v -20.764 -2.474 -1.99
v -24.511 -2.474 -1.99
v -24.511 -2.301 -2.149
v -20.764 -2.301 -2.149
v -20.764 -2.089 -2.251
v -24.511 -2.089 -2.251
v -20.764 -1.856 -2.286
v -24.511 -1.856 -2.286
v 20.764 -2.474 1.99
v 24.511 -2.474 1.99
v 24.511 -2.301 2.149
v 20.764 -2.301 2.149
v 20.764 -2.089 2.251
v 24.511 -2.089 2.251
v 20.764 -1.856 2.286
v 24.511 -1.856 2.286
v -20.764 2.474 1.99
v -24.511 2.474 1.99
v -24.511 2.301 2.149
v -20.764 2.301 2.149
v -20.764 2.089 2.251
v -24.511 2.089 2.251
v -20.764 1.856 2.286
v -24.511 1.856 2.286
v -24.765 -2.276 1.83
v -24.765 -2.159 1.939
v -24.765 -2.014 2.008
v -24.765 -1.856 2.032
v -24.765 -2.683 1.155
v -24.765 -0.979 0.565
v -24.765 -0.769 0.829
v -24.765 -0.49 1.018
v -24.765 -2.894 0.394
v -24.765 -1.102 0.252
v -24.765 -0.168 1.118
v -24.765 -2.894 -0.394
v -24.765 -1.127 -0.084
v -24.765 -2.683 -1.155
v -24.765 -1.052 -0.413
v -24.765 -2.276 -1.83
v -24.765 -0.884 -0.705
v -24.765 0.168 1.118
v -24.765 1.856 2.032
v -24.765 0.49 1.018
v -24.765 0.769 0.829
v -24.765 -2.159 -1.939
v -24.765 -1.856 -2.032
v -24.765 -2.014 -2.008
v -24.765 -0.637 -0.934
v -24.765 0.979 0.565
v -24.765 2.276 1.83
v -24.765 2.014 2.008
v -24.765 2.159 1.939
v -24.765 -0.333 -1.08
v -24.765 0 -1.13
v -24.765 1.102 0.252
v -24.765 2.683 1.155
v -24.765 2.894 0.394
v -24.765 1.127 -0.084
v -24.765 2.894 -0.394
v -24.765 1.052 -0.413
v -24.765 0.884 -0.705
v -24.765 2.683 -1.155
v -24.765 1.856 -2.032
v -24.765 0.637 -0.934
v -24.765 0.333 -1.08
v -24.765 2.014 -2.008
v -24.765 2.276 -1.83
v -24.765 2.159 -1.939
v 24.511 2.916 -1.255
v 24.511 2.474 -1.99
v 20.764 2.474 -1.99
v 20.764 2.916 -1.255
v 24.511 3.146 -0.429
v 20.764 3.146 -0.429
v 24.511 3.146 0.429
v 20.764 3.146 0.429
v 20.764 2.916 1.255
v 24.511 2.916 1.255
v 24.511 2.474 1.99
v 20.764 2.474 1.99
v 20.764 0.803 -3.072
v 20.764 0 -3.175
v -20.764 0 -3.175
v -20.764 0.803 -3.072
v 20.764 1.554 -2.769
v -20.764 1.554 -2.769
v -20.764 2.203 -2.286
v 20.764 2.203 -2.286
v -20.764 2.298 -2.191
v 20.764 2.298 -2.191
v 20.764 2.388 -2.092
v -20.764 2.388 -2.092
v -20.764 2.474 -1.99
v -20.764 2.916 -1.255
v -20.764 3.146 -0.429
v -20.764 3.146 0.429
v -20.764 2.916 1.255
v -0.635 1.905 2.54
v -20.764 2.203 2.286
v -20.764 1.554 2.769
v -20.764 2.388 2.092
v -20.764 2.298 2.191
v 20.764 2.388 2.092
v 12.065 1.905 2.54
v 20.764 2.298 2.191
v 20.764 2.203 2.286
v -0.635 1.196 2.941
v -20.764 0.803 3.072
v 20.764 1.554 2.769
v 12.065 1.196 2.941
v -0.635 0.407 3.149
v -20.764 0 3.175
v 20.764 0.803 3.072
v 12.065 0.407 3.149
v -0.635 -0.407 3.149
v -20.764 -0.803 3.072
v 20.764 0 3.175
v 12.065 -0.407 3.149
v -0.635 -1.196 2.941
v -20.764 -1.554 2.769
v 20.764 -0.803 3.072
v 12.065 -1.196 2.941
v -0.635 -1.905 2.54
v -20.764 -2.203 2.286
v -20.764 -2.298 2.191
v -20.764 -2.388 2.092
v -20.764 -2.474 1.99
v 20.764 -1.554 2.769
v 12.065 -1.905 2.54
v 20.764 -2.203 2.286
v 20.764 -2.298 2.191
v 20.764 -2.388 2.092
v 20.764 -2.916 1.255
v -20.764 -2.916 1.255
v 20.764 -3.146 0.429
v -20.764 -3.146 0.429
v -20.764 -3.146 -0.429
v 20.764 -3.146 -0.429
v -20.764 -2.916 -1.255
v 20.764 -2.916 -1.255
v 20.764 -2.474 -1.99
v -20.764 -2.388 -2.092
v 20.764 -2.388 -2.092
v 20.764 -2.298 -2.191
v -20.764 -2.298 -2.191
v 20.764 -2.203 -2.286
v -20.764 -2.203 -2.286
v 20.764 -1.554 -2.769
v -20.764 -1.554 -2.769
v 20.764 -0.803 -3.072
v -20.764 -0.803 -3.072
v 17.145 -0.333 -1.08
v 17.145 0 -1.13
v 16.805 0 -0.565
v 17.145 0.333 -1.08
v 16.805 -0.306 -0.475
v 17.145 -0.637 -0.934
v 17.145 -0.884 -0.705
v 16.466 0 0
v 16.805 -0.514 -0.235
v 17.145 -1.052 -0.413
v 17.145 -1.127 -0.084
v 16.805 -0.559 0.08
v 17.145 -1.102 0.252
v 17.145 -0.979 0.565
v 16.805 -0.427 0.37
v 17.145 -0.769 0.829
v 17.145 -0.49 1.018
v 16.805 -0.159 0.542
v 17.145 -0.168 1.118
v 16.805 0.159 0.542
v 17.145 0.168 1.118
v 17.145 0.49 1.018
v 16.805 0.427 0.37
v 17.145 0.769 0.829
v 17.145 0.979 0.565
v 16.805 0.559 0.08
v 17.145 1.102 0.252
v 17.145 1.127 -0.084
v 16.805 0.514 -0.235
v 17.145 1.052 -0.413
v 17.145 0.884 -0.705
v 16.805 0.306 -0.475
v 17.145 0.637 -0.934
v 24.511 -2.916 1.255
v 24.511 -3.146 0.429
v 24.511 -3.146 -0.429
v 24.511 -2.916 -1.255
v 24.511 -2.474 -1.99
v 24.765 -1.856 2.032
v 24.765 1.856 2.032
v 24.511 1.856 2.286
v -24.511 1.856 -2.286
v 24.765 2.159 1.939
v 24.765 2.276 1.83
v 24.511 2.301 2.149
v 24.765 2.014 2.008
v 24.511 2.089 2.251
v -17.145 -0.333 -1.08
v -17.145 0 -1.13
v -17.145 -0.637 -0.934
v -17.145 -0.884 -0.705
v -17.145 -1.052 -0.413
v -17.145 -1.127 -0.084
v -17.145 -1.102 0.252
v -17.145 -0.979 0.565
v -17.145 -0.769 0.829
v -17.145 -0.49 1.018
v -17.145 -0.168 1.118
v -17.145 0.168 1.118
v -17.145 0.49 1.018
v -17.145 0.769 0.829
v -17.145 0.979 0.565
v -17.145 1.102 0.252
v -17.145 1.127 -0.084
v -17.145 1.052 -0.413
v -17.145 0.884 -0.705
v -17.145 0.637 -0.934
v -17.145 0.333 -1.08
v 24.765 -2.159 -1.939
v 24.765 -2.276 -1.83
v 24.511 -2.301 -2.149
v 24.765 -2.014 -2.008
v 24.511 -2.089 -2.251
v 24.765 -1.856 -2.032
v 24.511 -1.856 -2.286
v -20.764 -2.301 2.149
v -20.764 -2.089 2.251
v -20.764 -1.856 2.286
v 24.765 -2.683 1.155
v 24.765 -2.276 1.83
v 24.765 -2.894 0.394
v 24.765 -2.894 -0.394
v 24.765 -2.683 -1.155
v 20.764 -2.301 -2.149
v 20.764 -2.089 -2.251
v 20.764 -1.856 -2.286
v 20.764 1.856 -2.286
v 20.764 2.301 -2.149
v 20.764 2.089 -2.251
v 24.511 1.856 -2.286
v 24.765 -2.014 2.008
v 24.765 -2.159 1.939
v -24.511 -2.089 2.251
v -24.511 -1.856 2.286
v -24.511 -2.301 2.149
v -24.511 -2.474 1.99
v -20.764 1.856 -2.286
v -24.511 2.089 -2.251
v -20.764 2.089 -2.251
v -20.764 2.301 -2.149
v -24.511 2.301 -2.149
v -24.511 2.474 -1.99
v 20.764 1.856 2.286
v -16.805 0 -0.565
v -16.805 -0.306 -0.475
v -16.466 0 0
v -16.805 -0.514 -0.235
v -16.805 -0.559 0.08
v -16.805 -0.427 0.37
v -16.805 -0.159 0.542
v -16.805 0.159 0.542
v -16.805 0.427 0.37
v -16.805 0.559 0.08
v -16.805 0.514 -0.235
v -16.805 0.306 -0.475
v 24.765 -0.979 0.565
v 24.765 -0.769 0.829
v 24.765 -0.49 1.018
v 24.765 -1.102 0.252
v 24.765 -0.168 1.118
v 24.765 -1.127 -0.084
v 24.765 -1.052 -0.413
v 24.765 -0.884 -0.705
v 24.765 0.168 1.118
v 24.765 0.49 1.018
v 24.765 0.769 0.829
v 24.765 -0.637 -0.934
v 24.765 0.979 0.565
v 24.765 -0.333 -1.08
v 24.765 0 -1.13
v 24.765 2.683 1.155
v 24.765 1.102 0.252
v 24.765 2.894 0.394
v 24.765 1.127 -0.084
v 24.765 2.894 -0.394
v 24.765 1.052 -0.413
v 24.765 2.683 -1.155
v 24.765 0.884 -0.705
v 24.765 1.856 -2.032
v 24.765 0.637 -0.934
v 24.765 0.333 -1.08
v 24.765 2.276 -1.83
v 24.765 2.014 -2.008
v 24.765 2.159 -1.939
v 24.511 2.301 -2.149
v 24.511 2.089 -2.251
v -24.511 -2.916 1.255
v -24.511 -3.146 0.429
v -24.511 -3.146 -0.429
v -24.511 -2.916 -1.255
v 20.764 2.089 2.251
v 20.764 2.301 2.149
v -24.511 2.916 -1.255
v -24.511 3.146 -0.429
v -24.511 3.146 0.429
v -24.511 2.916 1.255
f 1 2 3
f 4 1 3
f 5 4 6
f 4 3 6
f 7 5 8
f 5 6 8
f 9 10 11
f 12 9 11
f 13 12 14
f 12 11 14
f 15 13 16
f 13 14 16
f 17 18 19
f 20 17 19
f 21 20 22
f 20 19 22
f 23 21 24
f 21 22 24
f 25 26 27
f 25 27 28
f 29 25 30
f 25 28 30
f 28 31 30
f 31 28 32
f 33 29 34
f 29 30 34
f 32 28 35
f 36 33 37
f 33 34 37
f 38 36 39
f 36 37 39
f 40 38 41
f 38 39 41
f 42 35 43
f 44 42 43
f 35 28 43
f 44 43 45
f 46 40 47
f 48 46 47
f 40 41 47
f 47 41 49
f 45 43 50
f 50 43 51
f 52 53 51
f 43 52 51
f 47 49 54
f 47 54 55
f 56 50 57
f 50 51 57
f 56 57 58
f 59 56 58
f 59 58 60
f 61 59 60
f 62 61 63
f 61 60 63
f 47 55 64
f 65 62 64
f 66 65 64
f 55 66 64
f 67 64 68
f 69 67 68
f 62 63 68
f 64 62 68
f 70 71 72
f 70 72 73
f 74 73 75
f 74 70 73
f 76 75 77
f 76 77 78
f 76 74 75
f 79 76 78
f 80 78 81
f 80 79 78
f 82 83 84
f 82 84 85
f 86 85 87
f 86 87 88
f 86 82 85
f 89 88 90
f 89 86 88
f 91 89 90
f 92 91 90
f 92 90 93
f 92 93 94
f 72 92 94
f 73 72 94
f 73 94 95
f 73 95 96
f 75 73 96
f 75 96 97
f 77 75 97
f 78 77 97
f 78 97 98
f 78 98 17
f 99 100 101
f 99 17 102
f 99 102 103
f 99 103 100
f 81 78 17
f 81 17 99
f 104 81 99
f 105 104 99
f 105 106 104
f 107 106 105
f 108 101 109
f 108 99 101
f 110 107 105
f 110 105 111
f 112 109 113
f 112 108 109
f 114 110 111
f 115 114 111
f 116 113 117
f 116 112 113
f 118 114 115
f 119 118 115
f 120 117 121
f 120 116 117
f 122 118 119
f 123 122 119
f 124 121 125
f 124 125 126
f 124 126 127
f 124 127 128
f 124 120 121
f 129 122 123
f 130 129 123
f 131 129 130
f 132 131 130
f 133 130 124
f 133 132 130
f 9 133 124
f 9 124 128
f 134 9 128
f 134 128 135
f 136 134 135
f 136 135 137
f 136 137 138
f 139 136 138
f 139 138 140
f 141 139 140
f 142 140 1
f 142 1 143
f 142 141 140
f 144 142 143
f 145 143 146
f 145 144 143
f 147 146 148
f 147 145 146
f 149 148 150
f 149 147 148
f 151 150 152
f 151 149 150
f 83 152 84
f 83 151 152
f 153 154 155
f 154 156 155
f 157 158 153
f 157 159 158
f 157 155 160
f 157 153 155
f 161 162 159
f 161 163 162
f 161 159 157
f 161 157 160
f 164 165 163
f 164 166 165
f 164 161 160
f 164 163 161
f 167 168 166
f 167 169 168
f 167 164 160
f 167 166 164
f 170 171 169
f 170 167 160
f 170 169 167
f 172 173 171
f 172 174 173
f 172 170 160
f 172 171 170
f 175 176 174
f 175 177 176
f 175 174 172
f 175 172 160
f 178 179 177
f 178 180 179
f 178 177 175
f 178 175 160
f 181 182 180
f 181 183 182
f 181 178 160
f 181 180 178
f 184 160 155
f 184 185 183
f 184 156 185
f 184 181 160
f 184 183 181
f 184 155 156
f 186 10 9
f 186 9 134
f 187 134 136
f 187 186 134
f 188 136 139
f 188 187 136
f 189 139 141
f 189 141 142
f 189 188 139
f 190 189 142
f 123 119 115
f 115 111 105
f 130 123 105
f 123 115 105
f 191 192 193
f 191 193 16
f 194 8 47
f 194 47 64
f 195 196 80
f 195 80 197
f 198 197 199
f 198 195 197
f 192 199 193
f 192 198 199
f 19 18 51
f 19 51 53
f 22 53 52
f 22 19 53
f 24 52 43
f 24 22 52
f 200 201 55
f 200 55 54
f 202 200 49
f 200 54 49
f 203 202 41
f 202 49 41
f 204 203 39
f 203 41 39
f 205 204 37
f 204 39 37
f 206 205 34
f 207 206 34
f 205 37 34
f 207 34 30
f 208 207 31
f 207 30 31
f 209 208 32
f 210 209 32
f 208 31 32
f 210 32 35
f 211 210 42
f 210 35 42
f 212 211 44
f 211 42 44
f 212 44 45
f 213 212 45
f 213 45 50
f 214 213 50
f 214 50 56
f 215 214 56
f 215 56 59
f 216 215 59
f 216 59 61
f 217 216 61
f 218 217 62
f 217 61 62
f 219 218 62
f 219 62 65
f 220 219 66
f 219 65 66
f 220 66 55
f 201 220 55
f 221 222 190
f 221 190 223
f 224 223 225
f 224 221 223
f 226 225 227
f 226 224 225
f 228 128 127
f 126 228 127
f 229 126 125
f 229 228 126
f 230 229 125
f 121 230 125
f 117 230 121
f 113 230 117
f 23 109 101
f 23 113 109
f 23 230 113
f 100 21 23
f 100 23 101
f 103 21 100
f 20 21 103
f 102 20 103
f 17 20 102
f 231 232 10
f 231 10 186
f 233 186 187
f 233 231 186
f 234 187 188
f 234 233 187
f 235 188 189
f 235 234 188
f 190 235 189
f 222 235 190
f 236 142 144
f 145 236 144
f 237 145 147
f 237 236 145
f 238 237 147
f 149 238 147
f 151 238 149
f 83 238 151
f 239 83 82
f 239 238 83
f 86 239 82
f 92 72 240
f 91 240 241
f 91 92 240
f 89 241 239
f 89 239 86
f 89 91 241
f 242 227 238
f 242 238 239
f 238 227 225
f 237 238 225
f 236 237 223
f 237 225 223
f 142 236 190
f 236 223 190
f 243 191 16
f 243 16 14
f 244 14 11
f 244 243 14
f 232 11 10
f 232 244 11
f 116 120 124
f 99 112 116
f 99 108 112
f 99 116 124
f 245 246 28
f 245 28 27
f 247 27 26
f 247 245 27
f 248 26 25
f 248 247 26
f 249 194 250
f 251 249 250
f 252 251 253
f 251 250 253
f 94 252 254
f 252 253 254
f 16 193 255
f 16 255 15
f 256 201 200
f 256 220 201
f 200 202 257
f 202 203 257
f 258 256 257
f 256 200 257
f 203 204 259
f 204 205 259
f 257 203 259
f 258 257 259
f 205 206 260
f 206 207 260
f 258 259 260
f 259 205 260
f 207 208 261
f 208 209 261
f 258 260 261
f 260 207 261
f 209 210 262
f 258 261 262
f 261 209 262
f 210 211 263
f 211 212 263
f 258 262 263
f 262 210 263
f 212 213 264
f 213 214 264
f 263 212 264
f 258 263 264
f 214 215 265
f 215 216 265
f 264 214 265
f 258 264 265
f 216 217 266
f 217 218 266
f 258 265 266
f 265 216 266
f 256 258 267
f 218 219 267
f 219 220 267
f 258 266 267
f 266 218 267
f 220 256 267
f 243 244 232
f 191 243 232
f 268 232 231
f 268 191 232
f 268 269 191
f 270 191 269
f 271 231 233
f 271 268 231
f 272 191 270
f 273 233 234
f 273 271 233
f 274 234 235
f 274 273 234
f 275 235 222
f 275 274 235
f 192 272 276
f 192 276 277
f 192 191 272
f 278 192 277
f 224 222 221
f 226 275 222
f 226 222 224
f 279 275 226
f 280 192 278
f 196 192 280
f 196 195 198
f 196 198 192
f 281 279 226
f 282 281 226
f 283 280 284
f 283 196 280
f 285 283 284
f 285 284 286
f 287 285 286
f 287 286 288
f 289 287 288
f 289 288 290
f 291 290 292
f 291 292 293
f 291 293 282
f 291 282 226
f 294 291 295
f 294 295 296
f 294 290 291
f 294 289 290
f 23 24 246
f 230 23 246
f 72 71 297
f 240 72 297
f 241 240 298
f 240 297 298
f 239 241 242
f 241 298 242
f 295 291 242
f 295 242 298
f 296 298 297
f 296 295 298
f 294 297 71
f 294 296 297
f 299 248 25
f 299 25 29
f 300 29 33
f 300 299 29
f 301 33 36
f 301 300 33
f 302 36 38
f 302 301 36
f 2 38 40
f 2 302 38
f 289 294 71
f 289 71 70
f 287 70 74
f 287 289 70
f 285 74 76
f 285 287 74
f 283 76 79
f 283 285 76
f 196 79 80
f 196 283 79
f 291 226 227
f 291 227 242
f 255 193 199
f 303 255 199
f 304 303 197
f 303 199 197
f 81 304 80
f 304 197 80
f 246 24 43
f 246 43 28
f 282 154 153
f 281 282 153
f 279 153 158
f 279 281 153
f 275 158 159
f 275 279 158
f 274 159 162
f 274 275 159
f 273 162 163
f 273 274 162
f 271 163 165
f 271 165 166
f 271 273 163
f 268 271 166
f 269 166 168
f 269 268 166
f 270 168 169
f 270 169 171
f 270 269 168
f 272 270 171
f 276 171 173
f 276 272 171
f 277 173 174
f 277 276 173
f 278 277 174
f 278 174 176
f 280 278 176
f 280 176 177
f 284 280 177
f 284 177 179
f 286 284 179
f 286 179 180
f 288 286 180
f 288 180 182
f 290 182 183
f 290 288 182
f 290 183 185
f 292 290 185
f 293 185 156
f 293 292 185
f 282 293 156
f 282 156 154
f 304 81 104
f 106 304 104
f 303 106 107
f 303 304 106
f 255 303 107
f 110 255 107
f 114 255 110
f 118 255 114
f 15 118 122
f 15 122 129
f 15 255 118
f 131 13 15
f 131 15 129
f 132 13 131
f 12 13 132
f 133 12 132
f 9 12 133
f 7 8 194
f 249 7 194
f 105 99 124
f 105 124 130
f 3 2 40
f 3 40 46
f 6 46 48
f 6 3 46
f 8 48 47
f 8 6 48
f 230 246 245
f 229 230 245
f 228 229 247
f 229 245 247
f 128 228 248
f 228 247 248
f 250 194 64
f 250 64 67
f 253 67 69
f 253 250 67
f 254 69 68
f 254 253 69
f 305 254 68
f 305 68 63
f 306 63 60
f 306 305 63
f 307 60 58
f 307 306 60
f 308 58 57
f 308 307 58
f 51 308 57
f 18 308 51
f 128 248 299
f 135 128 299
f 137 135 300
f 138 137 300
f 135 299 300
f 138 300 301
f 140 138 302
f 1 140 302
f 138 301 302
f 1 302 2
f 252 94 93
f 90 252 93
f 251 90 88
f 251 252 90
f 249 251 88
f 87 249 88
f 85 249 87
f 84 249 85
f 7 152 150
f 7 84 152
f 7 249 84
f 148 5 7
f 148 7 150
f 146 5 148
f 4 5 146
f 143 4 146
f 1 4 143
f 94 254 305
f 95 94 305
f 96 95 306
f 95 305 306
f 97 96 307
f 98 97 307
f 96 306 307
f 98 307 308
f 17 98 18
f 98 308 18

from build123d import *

# Parameters (mm, degrees)
SKETCH1_R                = 3.175
BOSS_EXTRUDE1_DEPTH      = 20.7645
BOSS_EXTRUDE2_START      = 4.0005
BOSS_EXTRUDE2_DEPTH      = 4.0005
FILLET1_R                = 0.79375
CHAMFER1_SIZE            = 0.254
FILLET1_OF_MIRROR2_R     = 0.79375
CHAMFER1_OF_MIRROR2_SIZE = 0.254
SKETCH5_W                = 12.7
SKETCH5_H                = 6.35
CUT_EXTRUDE1_DEPTH       = 0.635


with BuildPart() as part:
    # Sketch1 → Boss-Extrude1 (new, symmetric)
    with BuildSketch(Plane(origin=(0, 0, 0), x_dir=(0, 0, -1), z_dir=(1, 0, 0))):
        Circle(SKETCH1_R)
    extrude(amount=BOSS_EXTRUDE1_DEPTH, both=True)

    # Sketch2 → Boss-Extrude2 (add)
    with BuildSketch(Plane(origin=(20.7645, 0, 0), x_dir=(0, 0, -1), z_dir=(1, 0, 0)).offset(BOSS_EXTRUDE2_START)):
        with BuildLine():
            Line((-2.286, 2.20336765), (-2.286, -2.20336765))
            ThreePointArc((-2.286, -2.20336765), (0, -3.175), (2.286, -2.20336765))
            Line((2.286, -2.20336765), (2.286, 2.20336765))
            ThreePointArc((2.286, 2.20336765), (0, 3.175), (-2.286, 2.20336765))
        make_face()
    boss_extrude2 = extrude(amount=-BOSS_EXTRUDE2_DEPTH)

    # Fillet1
    # the kernel refuses this fillet: 0.79375 mm, written as the material it takes off along each edge
    with BuildSketch(Plane(origin=(25.768693051, 2.20336765, -2.286), x_dir=(0, 0.6746831627986616, 0.7381074649642793), z_dir=(-1, 0, 0)), Plane(origin=(25.768693051, -2.20336765, 2.286), x_dir=(0, -0.6746831627986605, -0.7381074649642803), z_dir=(-1, 0, 0))) as fillet1_piece_1:
        with BuildLine():
            CenterArc((0.351292568, -0.792161955), FILLET1_R, 86.375070371, 51.195378821)
            Line((-0.234580233, -0.256632195), (0, 0))
            ThreePointArc((0, 0), (0.20073861, 0.006352179), (0.40147722, 0))
        make_face()
    extrude(amount=5.004193051, mode=Mode.SUBTRACT)
    with BuildSketch(Plane(origin=(25.768693051, -2.20336765, -2.286), x_dir=(0, -0.6746831627986618, 0.738107464964279), z_dir=(-1, 0, 0)), Plane(origin=(25.768693051, 2.20336765, 2.286), x_dir=(0, 0.6746831627986606, -0.73810746496428), z_dir=(-1, 0, 0))) as fillet1_piece_2:
        with BuildLine():
            CenterArc((0.351292568, 0.792161955), FILLET1_R, 222.429550808, 51.195378821)
            Line((-0.234580233, 0.256632195), (0, 0))
            ThreePointArc((0, 0), (0.20073861, -0.006352179), (0.40147722, 0))
        make_face()
    extrude(amount=5.004193051, mode=Mode.SUBTRACT)

    # Sketch3 → #4-40 Tapped Hole1 (revolve, cut)
    with BuildSketch(Plane(origin=(24.765, 0, 0), x_dir=(0, 0, -1), z_dir=(0, 1, 0))):
        Polygon((0, 0), (0, 8.299152758), (1.1303, 7.62), (1.1303, 0), align=None)
    f_4_40_tapped_hole1 = revolve(axis=Axis((31.115, 0, 0), (-1, 0, 0)), mode=Mode.SUBTRACT)

    # Chamfer1
    chamfer1_edges = [part.edges().sort_by_distance(p)[0] for p in [
        (24.765, 0, -2.286),
        (24.765, 3.175, 0),
        (24.765, -3.175, 0),
        (24.765, 0, 2.286),
        (24.765, 2.198617373, 2.208093398),
        (24.765, -2.198617373, 2.208093398),
        (24.765, 2.198617373, -2.208093398),
        (24.765, -2.198617373, -2.208093398),
    ]]
    chamfer(chamfer1_edges, length=CHAMFER1_SIZE)

    # Mirror2: Boss-Extrude2, #4-40 Tapped Hole1 across plane
    add(boss_extrude2.mirror(Plane(origin=(0, 0, 0), x_dir=(0, 0, 1), z_dir=(1, 0, 0))))
    add(f_4_40_tapped_hole1.mirror(Plane(origin=(0, 0, 0), x_dir=(0, 0, 1), z_dir=(1, 0, 0))), mode=Mode.SUBTRACT)

    # Fillet1 of Mirror2
    # the kernel refuses this fillet: 0.79375 mm, written as the material it takes off along each edge
    with BuildSketch(Plane(origin=(-25.768693051, 2.20336765, -2.286), x_dir=(0, 0.6746831627986613, 0.7381074649642795), z_dir=(1, 0, 0)), Plane(origin=(-25.768693051, -2.20336765, 2.286), x_dir=(0, -0.67468316279866, -0.7381074649642806), z_dir=(1, 0, 0))) as fillet1_of_mirror2_piece_1:
        with BuildLine():
            CenterArc((0.351292568, 0.792161955), FILLET1_OF_MIRROR2_R, 222.429550808, 51.195378821)
            Line((-0.234580233, 0.256632195), (0, 0))
            ThreePointArc((0, 0), (0.20073861, -0.006352179), (0.40147722, 0))
        make_face()
    extrude(amount=5.004193051, mode=Mode.SUBTRACT)
    with BuildSketch(Plane(origin=(-25.768693051, -2.20336765, -2.286), x_dir=(0, -0.6746831627986595, 0.738107464964281), z_dir=(1, 0, 0)), Plane(origin=(-25.768693051, 2.20336765, 2.286), x_dir=(0, 0.674683162798661, -0.7381074649642797), z_dir=(1, 0, 0))) as fillet1_of_mirror2_piece_2:
        with BuildLine():
            CenterArc((0.351292568, -0.792161955), FILLET1_OF_MIRROR2_R, 86.375070371, 51.195378821)
            Line((-0.234580233, -0.256632195), (0, 0))
            ThreePointArc((0, 0), (0.20073861, 0.006352179), (0.40147722, 0))
        make_face()
    extrude(amount=5.004193051, mode=Mode.SUBTRACT)

    # Chamfer1 of Mirror2
    chamfer1_of_mirror2_edges = [part.edges().sort_by_distance(p)[0] for p in [
        (-24.765, 0, -2.286),
        (-24.765, 3.175, 0),
        (-24.765, -3.175, 0),
        (-24.765, 0, 2.286),
        (-24.765, 2.198617373, 2.208093398),
        (-24.765, -2.198617373, 2.208093398),
        (-24.765, 2.198617373, -2.208093398),
        (-24.765, -2.198617373, -2.208093398),
    ]]
    chamfer(chamfer1_of_mirror2_edges, length=CHAMFER1_OF_MIRROR2_SIZE)

    # Sketch5 → Cut-Extrude1 (cut)
    with BuildSketch(Plane.XY.offset(3.175)):
        with Locations((5.715, 0)):
            Rectangle(SKETCH5_W, SKETCH5_H)
    extrude(amount=-CUT_EXTRUDE1_DEPTH, mode=Mode.SUBTRACT)


solid = part.part
